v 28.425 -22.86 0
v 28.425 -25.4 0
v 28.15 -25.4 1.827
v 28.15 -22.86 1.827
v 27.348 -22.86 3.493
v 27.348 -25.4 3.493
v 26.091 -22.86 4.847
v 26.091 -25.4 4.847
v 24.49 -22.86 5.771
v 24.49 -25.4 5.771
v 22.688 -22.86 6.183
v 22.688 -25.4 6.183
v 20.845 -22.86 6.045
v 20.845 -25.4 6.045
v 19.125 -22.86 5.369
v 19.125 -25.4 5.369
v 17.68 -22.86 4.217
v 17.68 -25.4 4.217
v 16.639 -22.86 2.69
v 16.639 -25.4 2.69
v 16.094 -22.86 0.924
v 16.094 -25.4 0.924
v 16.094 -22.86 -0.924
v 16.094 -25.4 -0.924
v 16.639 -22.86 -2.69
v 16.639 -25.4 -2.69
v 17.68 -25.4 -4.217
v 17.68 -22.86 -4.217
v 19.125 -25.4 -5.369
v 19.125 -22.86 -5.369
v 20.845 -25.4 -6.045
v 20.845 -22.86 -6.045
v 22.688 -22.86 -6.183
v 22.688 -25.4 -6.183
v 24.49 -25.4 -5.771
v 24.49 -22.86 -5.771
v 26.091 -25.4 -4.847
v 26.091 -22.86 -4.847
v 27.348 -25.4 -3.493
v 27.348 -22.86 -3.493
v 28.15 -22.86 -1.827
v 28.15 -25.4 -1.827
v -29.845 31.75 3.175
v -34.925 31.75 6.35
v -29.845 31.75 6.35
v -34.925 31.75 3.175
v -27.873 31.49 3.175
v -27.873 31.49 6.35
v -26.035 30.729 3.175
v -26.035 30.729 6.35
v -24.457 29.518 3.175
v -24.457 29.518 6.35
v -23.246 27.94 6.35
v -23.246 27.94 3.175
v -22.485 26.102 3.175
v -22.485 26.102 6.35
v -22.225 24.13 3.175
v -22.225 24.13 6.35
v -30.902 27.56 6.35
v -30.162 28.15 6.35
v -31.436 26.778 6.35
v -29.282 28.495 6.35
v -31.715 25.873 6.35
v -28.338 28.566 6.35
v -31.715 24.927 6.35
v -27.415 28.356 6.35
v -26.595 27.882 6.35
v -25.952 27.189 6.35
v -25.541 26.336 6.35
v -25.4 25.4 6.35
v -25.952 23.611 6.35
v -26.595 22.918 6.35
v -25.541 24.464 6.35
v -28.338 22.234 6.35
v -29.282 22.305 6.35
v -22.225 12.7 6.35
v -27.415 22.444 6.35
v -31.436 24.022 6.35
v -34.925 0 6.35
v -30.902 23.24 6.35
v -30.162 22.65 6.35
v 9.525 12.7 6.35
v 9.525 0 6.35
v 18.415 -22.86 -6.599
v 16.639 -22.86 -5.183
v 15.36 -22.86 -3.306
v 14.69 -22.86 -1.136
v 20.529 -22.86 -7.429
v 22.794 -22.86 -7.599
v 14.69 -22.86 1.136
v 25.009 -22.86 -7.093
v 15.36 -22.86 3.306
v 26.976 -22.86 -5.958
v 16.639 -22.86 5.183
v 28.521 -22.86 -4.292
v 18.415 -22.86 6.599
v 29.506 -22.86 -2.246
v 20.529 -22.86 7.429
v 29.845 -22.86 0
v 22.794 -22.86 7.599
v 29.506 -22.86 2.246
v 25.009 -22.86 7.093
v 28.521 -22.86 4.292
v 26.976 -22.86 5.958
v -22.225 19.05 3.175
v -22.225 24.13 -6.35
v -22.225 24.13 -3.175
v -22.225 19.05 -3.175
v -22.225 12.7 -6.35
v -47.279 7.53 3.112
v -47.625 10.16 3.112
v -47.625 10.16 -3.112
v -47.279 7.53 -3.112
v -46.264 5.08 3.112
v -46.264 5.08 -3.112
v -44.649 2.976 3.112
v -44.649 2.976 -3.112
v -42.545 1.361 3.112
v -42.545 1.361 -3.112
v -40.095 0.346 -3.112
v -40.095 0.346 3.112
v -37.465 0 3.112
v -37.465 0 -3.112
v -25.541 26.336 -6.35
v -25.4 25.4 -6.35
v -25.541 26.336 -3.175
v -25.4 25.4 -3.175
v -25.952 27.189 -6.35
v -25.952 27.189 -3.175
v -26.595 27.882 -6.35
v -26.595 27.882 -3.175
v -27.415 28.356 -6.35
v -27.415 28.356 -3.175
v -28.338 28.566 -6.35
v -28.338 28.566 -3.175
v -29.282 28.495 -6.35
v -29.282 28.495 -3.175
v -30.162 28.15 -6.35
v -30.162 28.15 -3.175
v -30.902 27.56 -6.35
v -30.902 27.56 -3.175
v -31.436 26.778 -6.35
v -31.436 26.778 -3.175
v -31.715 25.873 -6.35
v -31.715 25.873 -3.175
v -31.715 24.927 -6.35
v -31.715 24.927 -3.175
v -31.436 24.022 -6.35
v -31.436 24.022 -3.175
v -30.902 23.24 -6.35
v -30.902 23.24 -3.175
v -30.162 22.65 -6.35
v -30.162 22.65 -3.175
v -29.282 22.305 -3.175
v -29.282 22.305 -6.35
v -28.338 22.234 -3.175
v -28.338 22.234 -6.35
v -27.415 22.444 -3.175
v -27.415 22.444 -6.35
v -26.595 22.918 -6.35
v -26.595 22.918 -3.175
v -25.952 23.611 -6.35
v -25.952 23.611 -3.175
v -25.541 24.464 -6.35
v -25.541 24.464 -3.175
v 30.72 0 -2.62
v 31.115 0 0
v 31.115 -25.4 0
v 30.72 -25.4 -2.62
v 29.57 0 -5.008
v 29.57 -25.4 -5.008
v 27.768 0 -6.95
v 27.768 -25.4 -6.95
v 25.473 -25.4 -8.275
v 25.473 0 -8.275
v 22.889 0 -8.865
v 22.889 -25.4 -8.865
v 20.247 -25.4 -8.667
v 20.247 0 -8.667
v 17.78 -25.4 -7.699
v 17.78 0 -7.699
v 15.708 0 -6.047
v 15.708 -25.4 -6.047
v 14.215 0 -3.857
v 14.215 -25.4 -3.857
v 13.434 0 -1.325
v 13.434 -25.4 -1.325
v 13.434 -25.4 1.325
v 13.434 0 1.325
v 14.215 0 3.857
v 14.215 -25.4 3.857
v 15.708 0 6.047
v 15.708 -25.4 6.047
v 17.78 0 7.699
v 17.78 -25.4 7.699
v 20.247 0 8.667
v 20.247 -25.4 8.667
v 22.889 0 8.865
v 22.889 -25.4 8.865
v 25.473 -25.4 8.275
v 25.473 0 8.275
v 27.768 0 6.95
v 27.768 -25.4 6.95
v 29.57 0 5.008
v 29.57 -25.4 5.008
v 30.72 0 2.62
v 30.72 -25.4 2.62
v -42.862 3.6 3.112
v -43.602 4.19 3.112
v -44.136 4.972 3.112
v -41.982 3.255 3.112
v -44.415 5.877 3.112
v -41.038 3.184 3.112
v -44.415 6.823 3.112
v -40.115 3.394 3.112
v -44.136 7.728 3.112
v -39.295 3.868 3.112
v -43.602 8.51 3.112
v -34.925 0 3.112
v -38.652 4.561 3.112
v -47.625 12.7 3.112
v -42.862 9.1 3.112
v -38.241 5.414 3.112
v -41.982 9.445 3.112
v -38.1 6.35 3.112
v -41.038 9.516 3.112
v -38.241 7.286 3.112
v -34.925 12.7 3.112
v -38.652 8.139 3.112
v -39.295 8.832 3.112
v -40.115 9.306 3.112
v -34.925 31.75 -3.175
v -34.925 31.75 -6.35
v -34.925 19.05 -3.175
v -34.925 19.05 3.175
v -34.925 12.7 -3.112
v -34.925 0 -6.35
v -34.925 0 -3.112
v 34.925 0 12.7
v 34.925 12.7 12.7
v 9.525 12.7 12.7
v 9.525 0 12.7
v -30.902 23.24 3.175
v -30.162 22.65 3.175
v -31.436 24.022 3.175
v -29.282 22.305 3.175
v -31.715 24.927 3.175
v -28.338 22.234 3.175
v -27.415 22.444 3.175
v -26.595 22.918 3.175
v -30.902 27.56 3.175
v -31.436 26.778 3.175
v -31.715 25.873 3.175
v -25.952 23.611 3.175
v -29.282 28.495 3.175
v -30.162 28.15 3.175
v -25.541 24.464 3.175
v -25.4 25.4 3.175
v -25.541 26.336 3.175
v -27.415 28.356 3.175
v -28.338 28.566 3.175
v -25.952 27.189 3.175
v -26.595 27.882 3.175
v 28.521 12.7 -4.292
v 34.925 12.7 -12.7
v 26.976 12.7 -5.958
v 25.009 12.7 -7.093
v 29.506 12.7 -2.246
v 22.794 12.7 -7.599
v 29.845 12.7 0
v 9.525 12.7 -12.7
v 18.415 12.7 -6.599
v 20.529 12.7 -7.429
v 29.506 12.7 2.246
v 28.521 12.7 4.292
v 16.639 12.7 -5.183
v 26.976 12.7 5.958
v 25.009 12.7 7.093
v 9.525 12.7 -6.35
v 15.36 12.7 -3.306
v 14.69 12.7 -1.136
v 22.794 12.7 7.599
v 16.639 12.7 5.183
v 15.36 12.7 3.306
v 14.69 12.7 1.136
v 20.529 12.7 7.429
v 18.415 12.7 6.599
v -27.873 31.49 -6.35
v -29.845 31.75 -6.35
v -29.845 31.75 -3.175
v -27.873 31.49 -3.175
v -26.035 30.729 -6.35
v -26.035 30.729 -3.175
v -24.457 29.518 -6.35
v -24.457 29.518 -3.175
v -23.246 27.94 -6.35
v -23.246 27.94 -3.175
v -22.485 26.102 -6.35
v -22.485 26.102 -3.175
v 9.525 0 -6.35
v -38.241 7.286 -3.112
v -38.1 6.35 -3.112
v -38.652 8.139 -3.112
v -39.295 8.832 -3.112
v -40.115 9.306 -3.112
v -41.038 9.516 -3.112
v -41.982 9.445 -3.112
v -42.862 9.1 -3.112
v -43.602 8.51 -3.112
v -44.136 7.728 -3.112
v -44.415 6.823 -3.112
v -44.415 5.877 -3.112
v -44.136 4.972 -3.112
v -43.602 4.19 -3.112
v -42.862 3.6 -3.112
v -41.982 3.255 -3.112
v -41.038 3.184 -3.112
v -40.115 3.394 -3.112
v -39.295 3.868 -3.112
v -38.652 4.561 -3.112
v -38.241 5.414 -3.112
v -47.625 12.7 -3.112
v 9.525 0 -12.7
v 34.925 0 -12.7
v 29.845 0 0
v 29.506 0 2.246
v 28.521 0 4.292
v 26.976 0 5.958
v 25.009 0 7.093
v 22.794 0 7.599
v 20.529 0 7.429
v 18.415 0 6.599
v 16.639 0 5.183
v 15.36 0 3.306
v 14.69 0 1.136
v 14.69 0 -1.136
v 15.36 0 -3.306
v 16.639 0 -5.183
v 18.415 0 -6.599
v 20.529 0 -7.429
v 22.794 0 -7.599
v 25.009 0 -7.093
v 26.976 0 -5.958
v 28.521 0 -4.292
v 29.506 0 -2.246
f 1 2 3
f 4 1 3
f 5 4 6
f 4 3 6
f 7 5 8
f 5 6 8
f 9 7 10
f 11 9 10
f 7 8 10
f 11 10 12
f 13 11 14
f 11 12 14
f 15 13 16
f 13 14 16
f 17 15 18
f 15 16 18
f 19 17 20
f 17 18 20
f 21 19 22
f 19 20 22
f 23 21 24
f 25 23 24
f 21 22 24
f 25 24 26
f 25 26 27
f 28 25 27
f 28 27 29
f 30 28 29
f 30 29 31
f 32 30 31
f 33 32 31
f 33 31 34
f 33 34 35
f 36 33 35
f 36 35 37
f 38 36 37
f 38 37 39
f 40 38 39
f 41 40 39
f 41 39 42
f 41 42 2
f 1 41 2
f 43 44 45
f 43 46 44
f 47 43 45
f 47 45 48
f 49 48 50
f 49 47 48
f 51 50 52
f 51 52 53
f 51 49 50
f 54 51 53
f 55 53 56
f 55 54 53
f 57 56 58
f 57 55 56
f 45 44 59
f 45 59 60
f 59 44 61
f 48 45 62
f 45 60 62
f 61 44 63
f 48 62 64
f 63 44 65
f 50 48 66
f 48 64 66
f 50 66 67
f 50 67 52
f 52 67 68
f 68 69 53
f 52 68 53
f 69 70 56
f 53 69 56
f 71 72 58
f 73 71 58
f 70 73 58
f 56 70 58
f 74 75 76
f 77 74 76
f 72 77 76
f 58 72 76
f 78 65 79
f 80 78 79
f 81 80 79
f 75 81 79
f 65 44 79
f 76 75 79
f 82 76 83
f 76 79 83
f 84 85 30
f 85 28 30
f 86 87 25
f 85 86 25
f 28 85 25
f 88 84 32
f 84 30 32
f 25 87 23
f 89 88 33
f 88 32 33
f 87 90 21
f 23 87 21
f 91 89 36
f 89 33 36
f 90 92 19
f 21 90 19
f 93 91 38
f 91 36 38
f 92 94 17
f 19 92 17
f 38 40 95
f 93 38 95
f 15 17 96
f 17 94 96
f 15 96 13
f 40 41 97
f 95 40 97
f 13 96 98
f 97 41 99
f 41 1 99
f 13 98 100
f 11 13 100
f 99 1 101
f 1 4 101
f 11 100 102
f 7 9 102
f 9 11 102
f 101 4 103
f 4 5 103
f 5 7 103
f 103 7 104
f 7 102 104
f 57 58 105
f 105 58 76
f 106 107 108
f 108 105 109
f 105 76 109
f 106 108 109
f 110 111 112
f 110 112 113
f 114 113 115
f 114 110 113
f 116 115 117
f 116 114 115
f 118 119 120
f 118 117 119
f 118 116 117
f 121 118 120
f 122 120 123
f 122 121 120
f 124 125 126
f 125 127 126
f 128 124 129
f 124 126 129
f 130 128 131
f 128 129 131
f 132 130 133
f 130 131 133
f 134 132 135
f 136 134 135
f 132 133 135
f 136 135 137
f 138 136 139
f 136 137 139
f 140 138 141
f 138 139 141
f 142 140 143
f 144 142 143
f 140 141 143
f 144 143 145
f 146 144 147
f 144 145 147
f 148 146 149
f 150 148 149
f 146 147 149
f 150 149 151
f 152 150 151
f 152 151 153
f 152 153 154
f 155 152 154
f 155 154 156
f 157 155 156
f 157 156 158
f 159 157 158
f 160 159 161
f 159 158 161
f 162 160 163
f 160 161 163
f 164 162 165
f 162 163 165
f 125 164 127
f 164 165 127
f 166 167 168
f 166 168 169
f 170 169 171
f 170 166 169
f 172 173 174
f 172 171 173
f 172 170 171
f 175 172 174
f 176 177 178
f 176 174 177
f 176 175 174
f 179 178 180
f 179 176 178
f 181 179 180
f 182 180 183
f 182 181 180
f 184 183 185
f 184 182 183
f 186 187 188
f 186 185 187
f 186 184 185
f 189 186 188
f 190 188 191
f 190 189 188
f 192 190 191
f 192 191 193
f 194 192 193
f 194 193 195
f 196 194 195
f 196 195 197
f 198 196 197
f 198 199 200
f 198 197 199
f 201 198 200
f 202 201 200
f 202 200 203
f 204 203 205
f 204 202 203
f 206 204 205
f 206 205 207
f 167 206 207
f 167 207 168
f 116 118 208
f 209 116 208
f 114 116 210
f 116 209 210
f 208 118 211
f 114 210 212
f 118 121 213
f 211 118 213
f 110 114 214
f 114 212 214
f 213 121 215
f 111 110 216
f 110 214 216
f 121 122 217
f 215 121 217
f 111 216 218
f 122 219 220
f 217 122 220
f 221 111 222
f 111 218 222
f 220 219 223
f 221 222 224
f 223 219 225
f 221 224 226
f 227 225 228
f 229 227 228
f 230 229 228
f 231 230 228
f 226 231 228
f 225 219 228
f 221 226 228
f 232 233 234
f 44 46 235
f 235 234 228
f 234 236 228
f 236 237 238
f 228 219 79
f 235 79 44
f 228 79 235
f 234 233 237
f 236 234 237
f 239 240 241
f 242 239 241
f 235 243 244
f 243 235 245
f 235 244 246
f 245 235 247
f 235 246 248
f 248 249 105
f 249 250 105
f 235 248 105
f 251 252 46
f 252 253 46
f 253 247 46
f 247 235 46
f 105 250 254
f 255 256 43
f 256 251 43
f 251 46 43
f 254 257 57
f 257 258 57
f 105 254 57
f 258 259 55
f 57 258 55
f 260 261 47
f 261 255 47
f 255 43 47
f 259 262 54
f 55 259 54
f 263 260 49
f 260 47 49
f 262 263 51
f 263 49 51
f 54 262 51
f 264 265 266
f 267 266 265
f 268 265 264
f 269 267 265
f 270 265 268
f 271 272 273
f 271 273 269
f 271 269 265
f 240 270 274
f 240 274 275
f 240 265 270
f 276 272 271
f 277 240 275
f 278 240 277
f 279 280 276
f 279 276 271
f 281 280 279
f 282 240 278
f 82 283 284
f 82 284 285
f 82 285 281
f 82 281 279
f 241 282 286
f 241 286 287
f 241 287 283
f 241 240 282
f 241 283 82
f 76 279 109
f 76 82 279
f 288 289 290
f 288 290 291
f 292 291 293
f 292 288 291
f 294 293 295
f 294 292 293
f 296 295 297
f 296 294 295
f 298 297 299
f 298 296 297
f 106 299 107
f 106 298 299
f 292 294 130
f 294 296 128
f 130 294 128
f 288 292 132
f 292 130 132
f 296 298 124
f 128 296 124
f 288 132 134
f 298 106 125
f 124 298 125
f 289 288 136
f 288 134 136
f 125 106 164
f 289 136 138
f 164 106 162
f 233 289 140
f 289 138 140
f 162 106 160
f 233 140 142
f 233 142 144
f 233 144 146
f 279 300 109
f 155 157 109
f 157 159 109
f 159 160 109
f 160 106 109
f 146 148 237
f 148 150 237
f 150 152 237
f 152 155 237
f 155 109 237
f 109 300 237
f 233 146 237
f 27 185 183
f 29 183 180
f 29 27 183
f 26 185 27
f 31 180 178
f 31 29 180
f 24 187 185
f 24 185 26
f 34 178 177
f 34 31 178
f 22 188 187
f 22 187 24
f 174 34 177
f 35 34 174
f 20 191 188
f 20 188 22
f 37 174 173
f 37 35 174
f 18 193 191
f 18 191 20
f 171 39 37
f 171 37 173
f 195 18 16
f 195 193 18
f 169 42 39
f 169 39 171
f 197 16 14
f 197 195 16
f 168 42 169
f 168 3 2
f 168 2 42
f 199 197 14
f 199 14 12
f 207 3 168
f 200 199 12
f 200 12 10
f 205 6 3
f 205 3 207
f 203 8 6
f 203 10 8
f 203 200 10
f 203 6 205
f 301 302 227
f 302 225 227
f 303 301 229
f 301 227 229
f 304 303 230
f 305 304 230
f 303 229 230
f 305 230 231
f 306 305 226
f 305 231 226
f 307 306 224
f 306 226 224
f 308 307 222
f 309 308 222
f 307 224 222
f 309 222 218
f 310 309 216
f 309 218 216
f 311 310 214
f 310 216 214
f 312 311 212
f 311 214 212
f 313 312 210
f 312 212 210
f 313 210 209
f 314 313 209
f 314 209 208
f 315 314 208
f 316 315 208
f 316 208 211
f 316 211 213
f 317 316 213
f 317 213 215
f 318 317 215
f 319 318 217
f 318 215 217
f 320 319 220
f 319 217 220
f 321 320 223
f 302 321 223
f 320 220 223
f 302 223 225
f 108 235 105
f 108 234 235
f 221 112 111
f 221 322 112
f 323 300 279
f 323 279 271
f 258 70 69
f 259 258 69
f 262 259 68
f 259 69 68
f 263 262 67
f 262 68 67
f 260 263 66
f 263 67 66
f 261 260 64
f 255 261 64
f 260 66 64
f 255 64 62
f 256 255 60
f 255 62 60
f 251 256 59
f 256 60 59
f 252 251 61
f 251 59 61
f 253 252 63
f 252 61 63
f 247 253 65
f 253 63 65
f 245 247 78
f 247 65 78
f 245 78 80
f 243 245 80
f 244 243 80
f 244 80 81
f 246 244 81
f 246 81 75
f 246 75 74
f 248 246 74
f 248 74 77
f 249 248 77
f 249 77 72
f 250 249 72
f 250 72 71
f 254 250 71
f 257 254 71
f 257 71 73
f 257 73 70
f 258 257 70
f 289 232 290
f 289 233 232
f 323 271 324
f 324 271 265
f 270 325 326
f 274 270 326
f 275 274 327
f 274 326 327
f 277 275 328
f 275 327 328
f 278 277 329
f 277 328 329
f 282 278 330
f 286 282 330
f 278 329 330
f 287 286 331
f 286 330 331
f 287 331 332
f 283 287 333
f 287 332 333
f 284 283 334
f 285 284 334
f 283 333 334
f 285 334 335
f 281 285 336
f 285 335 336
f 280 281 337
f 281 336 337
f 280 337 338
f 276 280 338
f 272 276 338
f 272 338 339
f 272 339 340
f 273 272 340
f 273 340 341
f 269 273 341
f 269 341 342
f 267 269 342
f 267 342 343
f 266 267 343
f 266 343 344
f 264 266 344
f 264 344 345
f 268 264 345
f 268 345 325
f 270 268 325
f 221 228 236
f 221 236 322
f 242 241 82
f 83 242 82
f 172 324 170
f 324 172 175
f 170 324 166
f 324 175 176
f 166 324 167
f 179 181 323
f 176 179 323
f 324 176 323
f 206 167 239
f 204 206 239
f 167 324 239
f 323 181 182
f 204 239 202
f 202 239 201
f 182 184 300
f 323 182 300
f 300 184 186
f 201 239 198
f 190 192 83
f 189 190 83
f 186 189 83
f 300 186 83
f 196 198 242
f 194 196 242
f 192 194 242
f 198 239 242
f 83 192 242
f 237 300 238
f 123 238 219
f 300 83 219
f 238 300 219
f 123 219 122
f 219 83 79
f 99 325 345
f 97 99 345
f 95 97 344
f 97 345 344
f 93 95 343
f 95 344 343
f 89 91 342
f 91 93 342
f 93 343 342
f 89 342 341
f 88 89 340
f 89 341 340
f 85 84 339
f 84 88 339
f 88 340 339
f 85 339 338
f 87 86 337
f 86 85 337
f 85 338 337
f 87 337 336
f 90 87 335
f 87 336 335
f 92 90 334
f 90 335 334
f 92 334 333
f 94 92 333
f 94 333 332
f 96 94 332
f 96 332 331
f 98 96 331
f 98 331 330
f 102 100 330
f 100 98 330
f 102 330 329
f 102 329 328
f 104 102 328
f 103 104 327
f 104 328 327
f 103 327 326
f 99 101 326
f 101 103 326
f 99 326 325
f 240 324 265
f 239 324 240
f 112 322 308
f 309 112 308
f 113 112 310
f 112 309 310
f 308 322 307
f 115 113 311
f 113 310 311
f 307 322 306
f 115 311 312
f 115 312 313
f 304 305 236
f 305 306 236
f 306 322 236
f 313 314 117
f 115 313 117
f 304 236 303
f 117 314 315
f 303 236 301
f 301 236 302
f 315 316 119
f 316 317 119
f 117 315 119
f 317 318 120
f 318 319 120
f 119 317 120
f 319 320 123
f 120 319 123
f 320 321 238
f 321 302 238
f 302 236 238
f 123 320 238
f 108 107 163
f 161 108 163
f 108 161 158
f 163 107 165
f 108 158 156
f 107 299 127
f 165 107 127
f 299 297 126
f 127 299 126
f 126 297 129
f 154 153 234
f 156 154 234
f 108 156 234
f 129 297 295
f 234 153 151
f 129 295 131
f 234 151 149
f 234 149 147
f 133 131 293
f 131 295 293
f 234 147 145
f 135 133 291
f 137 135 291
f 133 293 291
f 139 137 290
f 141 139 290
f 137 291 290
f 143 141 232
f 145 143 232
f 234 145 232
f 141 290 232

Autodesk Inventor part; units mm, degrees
ref_plane "YZ Plane" through (0, 0, 0) normal (1, 0, 0) x (0, 1, 0)
ref_plane "XZ Plane" through (0, 0, 0) normal (0, 1, 0) x (-1, 0, 0)
ref_plane "XY Plane" through (0, 0, 0) normal (0, 0, 1) x (1, 0, 0)
sketch "Sketch1" plane through (0, 0, 0) normal (0, 1, 0) x (-1, 0, 0)
  line L0 (-34.925, 6.35) -> (34.925, 6.35)
  line L1 (34.925, 6.35) -> (34.925, -6.35)
  line L2 (34.925, -6.35) -> (-34.925, -6.35)
  line L3 (-34.925, -6.35) -> (-34.925, 6.35)
  line L4 (-34.925, 6.35) -> (34.925, -6.35) construction
  line L5 (34.925, 6.35) -> (-34.925, -6.35) construction
  point P0 (0, 0)
  dimension "d0" = 69.85
  dimension "d1" = 12.7
extrude "Extrusion1" add sketch "Sketch1" along normal blind 12.7
sketch "Sketch2" plane through (-34.925, 0, -6.35) normal (-1, 0, 0) x (0, 0, 1)
  line L0 (0, 12.7) -> (12.7, 12.7) projected
  line L1 (3.2385, 0) -> (9.4615, 0)
  line L2 (9.4615, 0) -> (9.4615, 12.7)
  line L3 (9.4615, 12.7) -> (3.2385, 12.7)
  line L4 (3.2385, 12.7) -> (3.2385, 0)
  line L5 (3.2385, 0) -> (9.4615, 12.7) construction
  line L6 (9.4615, 0) -> (3.2385, 12.7) construction
  line L7 (12.7, 0) -> (12.7, 12.7) projected
  point P0 (6.35, 0)
  point P1 (6.35, 6.35)
  dimension "d4" = 6.223
  dimension "d5" = 12.7
  dimension "d6" = 3.2385
extrude "Extrusion2" add sketch "Sketch2" along normal blind 12.7
fillet "Fillet1" radius 10.16 1 edges at (-47.625, 0, 0)
sketch "Sketch3" plane through (-34.925, 0, 3.1115) normal (0, 0, 1) x (1, 0, 0)
  circle A0 centre (-6.35, 6.35) radius 3.175
  line L0 (0, 12.7) -> (-12.7, 12.7) projected
  line L1 (-12.7, 10.16) -> (-12.7, 12.7) projected
  point P0 (34.925, 0)
  dimension "d10" = 6.35
  dimension "d41" = 6.35
  dimension "d42" = 6.35
extrude "Extrusion3" cut sketch "Sketch3" against normal blind 12.7
sketch "Sketch4" plane through (0, 12.7, 0) normal (0, 1, 0) x (1, 0, 0)
  line L0 (-34.925, -3.1115) -> (-34.925, -6.35) projected
  line L1 (34.925, 6.35) -> (-34.925, 6.35) projected
  line L2 (-34.925, -6.35) -> (-22.225, -6.35)
  line L3 (-22.225, -6.35) -> (-22.225, 6.35)
  line L4 (-22.225, 6.35) -> (-34.925, 6.35)
  line L5 (-34.925, 6.35) -> (-34.925, -6.35)
  point P0 (0, 0)
  point P1 (-34.925, 6.35)
  dimension "d13" = 12.7
extrude "Extrusion4" add sketch "Sketch4" along normal blind 19.05
sketch "Sketch5" plane through (0, 31.75, 0) normal (0, 1, 0) x (1, 0, 0)
  line L0 (-34.925, -3.1115) -> (-34.925, -6.35) projected
  line L1 (-22.225, -6.35) -> (-22.225, 6.35) projected
  line L2 (-34.925, -3.175) -> (-22.225, -3.175)
  line L3 (-22.225, -3.175) -> (-22.225, 3.175)
  line L4 (-22.225, 3.175) -> (-34.925, 3.175)
  line L5 (-34.925, 3.175) -> (-34.925, -3.175)
  line L6 (-34.925, -6.35) -> (-22.225, -6.35) projected
  point P0 (0, 0)
  point P1 (-28.575, -6.35)
  dimension "d16" = 6.35
  dimension "d17" = 3.175
extrude "Extrusion5" cut sketch "Sketch5" against normal blind 12.7 contours L5 L4 L1 L2 L0
sketch "Sketch6" plane through (-34.925, 0, 6.35) normal (0, 0, 1) x (1, 0, 0)
  circle A0 centre (6.35, 25.4) radius 3.175
  line L0 (0, 31.75) -> (12.7, 31.75) projected
  line L1 (0, 0) -> (0, 31.75) projected
  point P0 (34.925, 0)
  dimension "d20" = 6.35
  dimension "d21" = 6.35
  dimension "d43" = 6.35
extrude "Extrusion6" cut sketch "Sketch6" against normal blind 12.7
sketch "Sketch7" plane through (0, 12.7, 0) normal (0, 1, 0) x (1, 0, 0)
  line L0 (34.925, -12.7) -> (9.525, -12.7)
  line L1 (9.525, -12.7) -> (9.525, 12.7)
  line L2 (9.525, 12.7) -> (34.925, 12.7)
  line L3 (34.925, 12.7) -> (34.925, -12.7)
  line L4 (34.925, -6.35) -> (34.925, 6.35) projected
  line L5 (-22.225, -6.35) -> (34.925, -6.35) projected
  point P0 (0, 0)
  dimension "d24" = 25.4
  dimension "d25" = 25.4
  dimension "d26" = 25.4
  dimension "d27" = 6.35
extrude "Extrusion7" add sketch "Sketch7" against normal blind 12.7
sketch "Sketch8" plane through (0, 0, 0) normal (0, -1, 0) x (1, 0, 0)
  circle A0 centre (22.225, 0) radius 8.89
  circle A1 centre (22.225, 0) radius 7.62
  line L0 (34.925, 12.7) -> (34.925, -12.7) projected
  point P0 (0, 0)
  dimension "d30" = 17.78
  dimension "d31" = 15.24
  dimension "d39" = 12.7
extrude "Extrusion8" add sketch "Sketch8" along normal blind 25.4
sketch "Sketch9" plane through (22.225, -25.4, 0) normal (0, -1, 0) x (1, 0, 0)
  circle A0 centre (0, 0) radius 6.2
  circle A1 centre (0, 0) radius 7.62
  point P0 (-22.225, 0)
  dimension "d34" = 12.4
  dimension "d45" = 15.24
extrude "Extrusion9" add sketch "Sketch9" against normal blind 2.54
sketch "Sketch10" plane through (22.225, 0, 0) normal (0, -1, 0) x (1, 0, 0)
  circle A0 centre (0, 0) radius 7.62
  point P0 (-22.225, 0)
extrude "Extrusion10" cut sketch "Sketch10" against normal blind 25.4
fillet "Fillet2" radius 7.62 2 edges at (-22.225, 31.75, 4.7625) (-22.225, 31.75, -4.7625)
properties part number "Press_Lower_Arm"
